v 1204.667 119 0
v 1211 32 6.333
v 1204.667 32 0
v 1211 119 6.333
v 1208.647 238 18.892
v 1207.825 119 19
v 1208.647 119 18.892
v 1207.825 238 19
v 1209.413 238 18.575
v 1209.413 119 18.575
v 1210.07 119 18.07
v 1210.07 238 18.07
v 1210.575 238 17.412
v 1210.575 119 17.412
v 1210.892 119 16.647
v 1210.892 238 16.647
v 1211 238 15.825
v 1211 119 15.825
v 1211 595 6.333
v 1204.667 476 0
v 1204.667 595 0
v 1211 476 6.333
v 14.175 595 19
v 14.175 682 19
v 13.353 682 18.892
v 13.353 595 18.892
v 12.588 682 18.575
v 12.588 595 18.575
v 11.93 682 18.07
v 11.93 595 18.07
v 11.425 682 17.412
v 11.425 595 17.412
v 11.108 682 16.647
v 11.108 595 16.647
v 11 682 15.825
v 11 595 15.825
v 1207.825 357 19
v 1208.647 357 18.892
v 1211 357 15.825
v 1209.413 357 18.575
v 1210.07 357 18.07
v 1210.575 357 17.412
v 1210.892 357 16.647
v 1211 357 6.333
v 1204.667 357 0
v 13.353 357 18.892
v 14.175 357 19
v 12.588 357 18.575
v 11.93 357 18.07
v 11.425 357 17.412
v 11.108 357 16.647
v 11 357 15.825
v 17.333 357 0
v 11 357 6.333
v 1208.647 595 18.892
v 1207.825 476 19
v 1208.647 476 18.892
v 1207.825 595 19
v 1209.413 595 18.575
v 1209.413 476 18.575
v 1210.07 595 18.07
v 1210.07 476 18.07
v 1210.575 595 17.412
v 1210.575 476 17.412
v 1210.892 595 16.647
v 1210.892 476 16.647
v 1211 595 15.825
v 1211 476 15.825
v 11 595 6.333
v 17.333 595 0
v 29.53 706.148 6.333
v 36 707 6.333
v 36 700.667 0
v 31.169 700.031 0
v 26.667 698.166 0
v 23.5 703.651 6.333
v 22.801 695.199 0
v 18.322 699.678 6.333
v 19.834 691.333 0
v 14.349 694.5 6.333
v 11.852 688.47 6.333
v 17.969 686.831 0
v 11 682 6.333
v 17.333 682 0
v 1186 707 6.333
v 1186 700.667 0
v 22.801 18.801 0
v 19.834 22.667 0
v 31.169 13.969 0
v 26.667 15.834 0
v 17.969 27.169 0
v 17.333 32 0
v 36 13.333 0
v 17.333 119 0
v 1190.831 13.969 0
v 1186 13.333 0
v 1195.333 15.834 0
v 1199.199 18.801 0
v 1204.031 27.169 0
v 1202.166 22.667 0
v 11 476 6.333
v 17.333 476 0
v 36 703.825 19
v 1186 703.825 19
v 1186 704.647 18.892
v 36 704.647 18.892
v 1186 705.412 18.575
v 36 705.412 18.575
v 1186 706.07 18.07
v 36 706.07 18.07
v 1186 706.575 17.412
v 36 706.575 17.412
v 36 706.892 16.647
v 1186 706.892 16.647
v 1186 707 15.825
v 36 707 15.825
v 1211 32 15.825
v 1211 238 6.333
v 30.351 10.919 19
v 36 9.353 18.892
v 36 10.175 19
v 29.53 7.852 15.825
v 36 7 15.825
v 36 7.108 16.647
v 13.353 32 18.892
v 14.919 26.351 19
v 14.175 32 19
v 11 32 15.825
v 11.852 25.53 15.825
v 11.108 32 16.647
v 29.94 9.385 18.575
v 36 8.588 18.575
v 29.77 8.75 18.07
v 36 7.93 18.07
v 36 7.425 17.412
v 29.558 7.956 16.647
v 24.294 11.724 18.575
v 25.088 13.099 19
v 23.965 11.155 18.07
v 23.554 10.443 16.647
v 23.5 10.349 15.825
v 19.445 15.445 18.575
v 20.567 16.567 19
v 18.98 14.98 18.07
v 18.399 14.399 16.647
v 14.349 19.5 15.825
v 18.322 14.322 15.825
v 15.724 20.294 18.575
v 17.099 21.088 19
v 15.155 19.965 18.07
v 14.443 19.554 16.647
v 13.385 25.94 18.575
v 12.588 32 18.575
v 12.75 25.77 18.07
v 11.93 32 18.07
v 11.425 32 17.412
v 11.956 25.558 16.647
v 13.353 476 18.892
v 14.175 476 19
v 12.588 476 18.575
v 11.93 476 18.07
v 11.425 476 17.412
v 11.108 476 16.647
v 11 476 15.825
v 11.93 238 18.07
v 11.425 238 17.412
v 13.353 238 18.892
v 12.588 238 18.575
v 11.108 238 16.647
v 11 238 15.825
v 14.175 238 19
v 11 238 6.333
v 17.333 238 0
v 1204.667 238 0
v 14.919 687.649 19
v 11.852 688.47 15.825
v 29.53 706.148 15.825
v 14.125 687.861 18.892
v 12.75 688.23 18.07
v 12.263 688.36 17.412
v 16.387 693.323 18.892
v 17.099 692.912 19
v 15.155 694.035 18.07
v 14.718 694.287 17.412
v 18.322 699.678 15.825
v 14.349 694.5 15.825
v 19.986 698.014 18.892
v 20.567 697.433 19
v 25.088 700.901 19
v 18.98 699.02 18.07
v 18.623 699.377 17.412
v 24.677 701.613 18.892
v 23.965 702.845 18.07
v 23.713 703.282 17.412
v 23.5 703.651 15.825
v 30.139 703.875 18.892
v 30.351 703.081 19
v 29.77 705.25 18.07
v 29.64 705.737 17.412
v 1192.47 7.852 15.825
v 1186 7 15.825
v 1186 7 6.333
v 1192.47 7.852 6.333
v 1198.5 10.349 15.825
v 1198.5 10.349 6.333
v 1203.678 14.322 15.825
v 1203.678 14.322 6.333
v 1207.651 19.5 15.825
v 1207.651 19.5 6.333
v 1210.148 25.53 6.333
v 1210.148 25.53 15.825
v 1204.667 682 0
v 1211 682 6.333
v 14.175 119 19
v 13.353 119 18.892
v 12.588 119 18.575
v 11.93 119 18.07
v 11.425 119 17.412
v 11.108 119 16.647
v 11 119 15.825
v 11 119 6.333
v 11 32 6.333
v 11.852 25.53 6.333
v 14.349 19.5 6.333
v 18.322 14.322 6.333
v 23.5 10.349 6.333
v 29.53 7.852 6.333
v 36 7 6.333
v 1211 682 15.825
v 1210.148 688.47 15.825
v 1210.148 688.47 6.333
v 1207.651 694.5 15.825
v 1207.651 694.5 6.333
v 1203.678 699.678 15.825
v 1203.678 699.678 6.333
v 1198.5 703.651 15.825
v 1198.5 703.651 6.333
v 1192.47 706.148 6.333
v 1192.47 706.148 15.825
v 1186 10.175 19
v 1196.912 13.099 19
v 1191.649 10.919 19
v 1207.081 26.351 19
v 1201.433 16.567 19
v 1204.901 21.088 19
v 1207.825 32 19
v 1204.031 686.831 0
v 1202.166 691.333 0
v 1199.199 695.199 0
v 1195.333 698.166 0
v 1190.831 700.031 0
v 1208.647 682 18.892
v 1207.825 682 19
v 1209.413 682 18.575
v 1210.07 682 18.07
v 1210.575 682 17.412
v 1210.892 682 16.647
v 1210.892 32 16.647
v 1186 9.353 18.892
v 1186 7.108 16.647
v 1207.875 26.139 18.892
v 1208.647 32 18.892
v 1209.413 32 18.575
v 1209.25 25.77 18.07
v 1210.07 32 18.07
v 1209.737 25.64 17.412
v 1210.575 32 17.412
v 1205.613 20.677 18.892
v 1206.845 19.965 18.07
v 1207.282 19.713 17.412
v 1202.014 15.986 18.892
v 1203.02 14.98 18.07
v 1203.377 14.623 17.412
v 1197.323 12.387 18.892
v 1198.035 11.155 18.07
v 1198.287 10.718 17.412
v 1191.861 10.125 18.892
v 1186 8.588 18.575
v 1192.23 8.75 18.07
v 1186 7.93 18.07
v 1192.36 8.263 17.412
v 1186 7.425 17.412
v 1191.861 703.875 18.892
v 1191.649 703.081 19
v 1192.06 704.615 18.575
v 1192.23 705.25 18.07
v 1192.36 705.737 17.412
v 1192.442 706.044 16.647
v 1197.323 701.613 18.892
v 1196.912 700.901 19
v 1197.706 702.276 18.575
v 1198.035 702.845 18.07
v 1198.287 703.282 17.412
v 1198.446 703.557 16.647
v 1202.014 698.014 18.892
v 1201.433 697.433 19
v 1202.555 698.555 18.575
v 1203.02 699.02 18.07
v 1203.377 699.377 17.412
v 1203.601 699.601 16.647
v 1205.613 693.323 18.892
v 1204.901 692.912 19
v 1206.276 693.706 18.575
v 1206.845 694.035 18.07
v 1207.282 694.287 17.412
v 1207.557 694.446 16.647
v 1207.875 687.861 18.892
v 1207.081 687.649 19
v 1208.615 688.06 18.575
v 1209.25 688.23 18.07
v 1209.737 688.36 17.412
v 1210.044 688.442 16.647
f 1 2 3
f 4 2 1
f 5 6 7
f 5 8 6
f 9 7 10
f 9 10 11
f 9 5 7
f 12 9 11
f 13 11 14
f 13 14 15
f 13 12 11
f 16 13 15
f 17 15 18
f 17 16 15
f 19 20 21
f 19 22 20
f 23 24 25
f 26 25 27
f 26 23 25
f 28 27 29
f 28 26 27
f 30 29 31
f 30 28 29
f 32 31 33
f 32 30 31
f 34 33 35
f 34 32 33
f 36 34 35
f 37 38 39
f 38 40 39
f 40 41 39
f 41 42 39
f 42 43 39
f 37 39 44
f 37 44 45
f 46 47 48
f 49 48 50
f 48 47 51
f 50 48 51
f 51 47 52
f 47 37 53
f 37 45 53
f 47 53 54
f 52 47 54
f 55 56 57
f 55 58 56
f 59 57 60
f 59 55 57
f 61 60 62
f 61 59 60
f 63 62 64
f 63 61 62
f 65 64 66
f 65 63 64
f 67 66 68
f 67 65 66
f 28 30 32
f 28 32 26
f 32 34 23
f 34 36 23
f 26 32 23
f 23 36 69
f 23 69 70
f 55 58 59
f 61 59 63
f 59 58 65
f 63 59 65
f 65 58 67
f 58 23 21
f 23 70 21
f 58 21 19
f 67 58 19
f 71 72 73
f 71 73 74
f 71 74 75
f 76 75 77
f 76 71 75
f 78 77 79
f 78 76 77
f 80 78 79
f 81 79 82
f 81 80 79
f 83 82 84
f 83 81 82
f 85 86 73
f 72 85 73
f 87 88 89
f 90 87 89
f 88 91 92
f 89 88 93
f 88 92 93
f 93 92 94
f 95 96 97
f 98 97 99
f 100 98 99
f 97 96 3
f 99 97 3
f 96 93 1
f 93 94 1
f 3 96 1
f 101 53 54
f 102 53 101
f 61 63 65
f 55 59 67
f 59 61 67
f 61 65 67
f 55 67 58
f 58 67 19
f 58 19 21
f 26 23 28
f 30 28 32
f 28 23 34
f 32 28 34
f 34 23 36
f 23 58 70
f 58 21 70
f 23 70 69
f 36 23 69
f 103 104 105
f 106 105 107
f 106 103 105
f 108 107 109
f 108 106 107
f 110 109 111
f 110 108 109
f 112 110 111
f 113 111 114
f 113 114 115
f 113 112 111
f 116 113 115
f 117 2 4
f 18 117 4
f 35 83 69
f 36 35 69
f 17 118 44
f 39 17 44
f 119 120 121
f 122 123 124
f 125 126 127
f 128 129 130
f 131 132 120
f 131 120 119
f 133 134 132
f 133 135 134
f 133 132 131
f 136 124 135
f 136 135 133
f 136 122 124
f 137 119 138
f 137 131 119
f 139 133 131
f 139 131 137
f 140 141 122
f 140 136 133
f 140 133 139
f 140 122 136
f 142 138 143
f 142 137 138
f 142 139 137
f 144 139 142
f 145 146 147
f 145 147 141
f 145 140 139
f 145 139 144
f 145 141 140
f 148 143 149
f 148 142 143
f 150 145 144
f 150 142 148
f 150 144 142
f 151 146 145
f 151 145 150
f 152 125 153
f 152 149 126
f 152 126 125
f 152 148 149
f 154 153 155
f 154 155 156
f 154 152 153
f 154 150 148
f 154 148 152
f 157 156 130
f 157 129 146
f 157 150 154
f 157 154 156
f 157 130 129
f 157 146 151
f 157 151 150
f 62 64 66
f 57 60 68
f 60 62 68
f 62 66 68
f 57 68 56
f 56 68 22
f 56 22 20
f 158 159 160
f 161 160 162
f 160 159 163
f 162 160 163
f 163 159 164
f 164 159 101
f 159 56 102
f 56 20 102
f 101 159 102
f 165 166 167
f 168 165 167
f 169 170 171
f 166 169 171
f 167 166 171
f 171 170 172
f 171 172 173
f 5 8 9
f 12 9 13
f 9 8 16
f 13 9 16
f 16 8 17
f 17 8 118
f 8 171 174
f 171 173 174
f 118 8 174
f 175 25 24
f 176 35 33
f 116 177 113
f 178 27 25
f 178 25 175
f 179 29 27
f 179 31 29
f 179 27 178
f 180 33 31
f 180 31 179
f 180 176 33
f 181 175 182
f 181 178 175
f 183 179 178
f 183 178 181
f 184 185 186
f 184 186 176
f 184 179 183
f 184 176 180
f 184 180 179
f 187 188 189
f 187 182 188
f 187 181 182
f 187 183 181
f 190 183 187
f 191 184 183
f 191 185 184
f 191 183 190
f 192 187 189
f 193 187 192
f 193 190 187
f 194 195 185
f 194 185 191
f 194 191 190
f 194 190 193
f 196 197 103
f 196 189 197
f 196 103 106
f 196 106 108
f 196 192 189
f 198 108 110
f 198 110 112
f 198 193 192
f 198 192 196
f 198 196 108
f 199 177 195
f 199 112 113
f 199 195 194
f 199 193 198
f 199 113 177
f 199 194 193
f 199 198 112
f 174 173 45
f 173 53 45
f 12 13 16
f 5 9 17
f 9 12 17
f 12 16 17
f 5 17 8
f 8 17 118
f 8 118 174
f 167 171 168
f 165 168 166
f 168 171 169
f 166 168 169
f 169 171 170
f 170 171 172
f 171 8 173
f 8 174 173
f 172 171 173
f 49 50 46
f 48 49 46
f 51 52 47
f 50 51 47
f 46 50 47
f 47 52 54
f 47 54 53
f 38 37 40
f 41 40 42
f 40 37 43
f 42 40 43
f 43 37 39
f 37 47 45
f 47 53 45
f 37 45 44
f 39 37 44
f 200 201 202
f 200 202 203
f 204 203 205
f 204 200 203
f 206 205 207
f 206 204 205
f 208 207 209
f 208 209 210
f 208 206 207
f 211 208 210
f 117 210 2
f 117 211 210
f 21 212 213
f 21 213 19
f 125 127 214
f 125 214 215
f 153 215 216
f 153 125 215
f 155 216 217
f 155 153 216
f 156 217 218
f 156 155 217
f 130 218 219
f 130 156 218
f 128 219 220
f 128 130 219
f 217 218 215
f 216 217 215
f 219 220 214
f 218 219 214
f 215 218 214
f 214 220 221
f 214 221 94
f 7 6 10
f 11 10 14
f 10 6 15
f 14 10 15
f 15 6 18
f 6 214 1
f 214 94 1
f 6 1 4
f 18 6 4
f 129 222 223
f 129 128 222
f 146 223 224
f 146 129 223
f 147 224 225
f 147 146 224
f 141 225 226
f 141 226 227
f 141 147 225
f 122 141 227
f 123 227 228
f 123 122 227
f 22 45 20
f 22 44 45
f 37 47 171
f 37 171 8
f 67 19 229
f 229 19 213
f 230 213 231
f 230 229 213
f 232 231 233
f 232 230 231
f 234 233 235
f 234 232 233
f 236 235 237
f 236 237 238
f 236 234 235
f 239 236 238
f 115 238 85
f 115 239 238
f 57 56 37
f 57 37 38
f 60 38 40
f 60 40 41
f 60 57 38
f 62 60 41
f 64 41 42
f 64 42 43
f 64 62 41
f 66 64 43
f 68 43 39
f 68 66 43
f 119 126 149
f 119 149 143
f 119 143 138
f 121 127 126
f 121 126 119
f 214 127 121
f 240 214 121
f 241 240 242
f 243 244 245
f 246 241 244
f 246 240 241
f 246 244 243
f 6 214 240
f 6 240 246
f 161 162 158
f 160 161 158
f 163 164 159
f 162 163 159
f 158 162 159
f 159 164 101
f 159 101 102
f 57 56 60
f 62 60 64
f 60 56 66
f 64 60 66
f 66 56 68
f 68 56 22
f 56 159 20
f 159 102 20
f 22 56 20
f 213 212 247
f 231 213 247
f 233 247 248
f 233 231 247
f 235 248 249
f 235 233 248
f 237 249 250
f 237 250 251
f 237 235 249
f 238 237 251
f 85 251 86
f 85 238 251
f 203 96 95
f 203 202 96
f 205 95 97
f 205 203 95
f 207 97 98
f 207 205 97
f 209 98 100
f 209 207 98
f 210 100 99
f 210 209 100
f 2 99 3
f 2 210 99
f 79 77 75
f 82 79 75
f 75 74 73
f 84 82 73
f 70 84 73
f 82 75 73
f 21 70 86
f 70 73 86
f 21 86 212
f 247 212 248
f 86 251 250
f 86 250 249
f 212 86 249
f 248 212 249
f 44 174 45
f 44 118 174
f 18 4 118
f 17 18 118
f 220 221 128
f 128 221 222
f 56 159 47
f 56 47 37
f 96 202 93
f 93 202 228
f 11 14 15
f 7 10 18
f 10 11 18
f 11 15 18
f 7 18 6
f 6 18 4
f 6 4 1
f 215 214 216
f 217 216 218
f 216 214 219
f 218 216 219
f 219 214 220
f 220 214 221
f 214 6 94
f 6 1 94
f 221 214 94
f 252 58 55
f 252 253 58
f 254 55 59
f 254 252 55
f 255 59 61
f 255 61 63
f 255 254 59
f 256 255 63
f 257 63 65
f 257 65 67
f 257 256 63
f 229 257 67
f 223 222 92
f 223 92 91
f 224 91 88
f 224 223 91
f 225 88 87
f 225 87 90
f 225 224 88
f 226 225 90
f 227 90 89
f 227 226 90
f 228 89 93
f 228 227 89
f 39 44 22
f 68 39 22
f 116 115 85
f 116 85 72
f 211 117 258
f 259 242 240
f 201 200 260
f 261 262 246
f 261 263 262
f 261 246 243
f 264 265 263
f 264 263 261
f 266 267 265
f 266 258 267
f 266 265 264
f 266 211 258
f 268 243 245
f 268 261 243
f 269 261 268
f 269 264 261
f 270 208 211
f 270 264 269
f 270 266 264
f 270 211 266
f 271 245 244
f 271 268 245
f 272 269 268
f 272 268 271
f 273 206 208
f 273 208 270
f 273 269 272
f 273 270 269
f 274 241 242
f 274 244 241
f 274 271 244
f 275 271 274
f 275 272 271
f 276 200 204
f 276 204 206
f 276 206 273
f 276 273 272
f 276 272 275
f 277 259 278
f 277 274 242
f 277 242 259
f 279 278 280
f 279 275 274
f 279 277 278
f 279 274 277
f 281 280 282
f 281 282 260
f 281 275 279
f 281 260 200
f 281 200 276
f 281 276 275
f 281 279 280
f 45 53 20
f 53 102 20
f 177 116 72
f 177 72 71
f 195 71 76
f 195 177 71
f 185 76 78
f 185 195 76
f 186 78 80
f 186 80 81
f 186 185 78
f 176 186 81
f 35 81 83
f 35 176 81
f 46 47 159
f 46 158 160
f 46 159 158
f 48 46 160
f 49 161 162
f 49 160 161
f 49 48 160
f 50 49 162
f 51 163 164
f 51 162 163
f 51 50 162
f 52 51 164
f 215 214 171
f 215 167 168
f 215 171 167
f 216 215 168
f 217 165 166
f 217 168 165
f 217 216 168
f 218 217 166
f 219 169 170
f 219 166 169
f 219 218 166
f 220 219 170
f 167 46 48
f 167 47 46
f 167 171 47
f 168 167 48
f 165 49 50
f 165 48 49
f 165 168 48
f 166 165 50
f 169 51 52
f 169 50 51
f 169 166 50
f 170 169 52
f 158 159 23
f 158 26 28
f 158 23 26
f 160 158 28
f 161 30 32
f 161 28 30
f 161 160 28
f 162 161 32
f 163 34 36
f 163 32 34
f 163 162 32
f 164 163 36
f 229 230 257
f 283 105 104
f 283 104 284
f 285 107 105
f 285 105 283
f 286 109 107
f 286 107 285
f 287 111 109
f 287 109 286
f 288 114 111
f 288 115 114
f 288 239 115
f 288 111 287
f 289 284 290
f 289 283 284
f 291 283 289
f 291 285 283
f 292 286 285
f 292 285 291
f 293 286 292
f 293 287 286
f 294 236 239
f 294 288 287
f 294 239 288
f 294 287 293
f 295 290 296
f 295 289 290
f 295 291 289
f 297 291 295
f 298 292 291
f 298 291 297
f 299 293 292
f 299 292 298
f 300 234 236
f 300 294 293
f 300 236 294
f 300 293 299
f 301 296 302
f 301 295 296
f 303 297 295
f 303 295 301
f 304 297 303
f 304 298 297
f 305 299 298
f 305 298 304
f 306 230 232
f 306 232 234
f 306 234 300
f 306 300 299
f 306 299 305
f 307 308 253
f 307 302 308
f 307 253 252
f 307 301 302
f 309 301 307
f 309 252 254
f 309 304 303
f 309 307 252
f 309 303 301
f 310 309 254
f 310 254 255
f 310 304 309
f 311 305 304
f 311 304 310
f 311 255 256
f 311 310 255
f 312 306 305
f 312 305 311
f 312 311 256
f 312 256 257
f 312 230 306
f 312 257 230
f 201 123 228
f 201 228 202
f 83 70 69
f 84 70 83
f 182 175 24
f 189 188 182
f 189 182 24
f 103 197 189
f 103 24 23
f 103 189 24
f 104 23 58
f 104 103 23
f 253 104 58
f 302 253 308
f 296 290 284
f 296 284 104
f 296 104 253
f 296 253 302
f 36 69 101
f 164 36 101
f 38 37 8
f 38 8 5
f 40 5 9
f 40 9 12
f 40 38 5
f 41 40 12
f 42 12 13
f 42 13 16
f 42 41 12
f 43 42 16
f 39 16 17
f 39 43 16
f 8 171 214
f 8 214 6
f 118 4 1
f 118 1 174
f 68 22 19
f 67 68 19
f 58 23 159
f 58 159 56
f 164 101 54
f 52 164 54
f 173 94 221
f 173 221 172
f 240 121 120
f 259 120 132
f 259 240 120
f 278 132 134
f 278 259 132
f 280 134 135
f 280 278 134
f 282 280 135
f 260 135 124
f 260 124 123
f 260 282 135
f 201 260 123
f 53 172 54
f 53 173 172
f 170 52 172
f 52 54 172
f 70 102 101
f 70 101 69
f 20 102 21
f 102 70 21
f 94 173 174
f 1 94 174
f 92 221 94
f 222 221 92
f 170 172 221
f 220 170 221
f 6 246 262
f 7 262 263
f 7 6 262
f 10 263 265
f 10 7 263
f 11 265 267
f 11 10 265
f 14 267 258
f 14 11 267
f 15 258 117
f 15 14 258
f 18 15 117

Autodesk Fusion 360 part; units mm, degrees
sketch "board" plane through (0, 0, 0) normal (0, 0, 1) x (1, 0, 0) in component "top"
  line L0 (0, 0) -> (1222, 0)
  line L1 (1222, 0) -> (1222, 119)
  line L2 (1222, 119) -> (0, 119)
  line L3 (0, 119) -> (0, 0)
  dimension "d8" = 119
  dimension "d9" = 1222
extrude "Extrude1" add sketch "board" along normal blind 19 makes body 1 in component "top"
pattern_linear "R-Pattern1" count 6 spacing 119 along (0, 1, 0) of bodies 1 makes body 2 at (407.3333, 198.3333, 0) makes body 3 at (407.3333, 317.3333, 0) makes body 4 at (407.3333, 436.3333, 0) makes body 5 at (407.3333, 555.3333, 0) makes body 6 at (407.3333, 674.3333, 0) in component "top"
sketch "target" plane through (0, 0, 0) normal (0, 0, 1) x (1, 0, 0) in component "top"
  line L0 (11, 7) -> (1211, 7)
  line L1 (1211, 7) -> (1211, 707)
  line L2 (1211, 707) -> (11, 707)
  line L3 (11, 707) -> (11, 7)
  line L4 (1211, 707) -> (1222, 714) construction
  line L5 (1211, 7) -> (1222, 0) construction
  line L6 (11, 7) -> (0, 0) construction
  line L7 (0, 714) -> (11, 707) construction
  point P0 (1222, 0)
  point P1 (0, 714)
  point P2 (1222, 714)
  dimension "d16" = 1200
  dimension "d17" = 700
extrude "Extrude2" cut sketch "target" along normal up to surface (19 mm away) keep common part bodies 1 2 3 4 5 6 in component "top"
sketch "top profile" plane through (0, 0, 19) normal (0, 0, 1) x (-1, 0, 0) in component "top"
  line L0 (-11, -119) -> (-11, -7)
  line L1 (-11, -7) -> (-1211, -7)
  line L2 (-1211, -7) -> (-1211, -119)
  line L3 (-1211, -119) -> (-11, -119)
  line L4 (-36, -7) -> (-1186, -7)
  line L5 (-1211, -32) -> (-1211, -682)
  line L6 (-1186, -707) -> (-36, -707)
  line L7 (-11, -682) -> (-11, -32)
  arc A0 (-36, -707) -> (-11, -682) centre (-36, -682) ccw
  arc A1 (-1211, -682) -> (-1186, -707) centre (-1186, -682) ccw
  arc A2 (-1186, -7) -> (-1211, -32) centre (-1186, -32) ccw
  arc A3 (-11, -32) -> (-36, -7) centre (-36, -32) ccw
  line L8 (-1211, -707) -> (-11, -707)
  line L9 (-1211, -7) -> (-1211, -707)
  line L10 (-11, -7) -> (-1211, -7)
  line L11 (-11, -707) -> (-11, -7)
  point P0 (-1211, -707)
  dimension "d21" = 25
extrude "Extrude3" cut sketch "top profile" against normal up to surface (19 mm away) contours L0 L1 L2 L3 L4 L5 L7 A2 A3 L9 L10 L11 | L3 L5 L6 L7 A0 A1 L8 L9 L11 keep common part bodies 1 2 3 4 5 6 in component "top"
fillet "Fillet1" radius 3.175 18 edges at (1211, 75.5, 19) (1203.6777, 14.3223, 19) (611, 7, 19) (18.3223, 14.3223, 19) (11, 75.5, 19) (1211, 178.5, 19) (11, 178.5, 19) (1211, 297.5, 19) (11, 297.5, 19) (1211, 416.5, 19) (11, 416.5, 19) (1211, 535.5, 19) (11, 535.5, 19) (11, 638.5, 19) (18.3223, 699.6777, 19) (611, 707, 19) (1203.6777, 699.6777, 19) (1211, 638.5, 19) on bodies 1 2 3 4 5 6 in component "top"
chamfer "Chamfer1" distance 6.3333 angle 45 18 edges at (1211, 416.5, 0) (11, 416.5, 0) (1211, 297.5, 0) (11, 297.5, 0) (611, 7, 0) (18.3223, 14.3223, 0) (11, 75.5, 0) (1211, 75.5, 0) (1203.6777, 14.3223, 0) (1211, 178.5, 0) (11, 178.5, 0) (1211, 638.5, 0) (1203.6777, 699.6777, 0) (611, 707, 0) (18.3223, 699.6777, 0) (11, 638.5, 0) (1211, 535.5, 0) (11, 535.5, 0) on bodies 1 2 3 4 5 6 in component "top"
sketch "hardware" plane through (0, 0, 0) normal (0, 0, 1) x (1, 0, 0) in component "hardware"
  line L0 (36, 17) -> (61, 17)
  line L1 (61, 17) -> (61, 697)
  line L2 (61, 697) -> (36, 697)
  line L3 (36, 697) -> (36, 17)
  line L4 (11, 707) -> (11, 7)
  line L5 (11, 7) -> (1211, 7)
  line L6 (1211, 707) -> (11, 707)
  line L7 (1211, 7) -> (1211, 707) construction
  line L8 (11, 357) -> (1211, 357) construction
  line L9 (611, 7) -> (611, 707) construction
  line L10 (1186, 697) -> (1186, 17)
  line L11 (1186, 17) -> (1161, 17)
  line L12 (1161, 697) -> (1186, 697)
  line L13 (1161, 17) -> (1161, 697)
  line L14 (137.2, 52.2) -> (213.4, 52.2)
  line L15 (213.4, 52.2) -> (213.4, 661.8)
  line L16 (213.4, 661.8) -> (137.2, 661.8)
  line L17 (137.2, 661.8) -> (137.2, 52.2)
  line L18 (175.3, 52.2) -> (175.3, 661.8) construction
  line L19 (137.2, 52.2) -> (213.4, 174.12) construction
  line L20 (213.4, 174.12) -> (137.2, 174.12) construction
  line L21 (137.2, 174.12) -> (213.4, 296.04) construction
  line L22 (213.4, 296.04) -> (137.2, 296.04) construction
  line L23 (137.2, 296.04) -> (213.4, 417.96) construction
  line L24 (213.4, 417.96) -> (137.2, 417.96) construction
  line L25 (137.2, 417.96) -> (213.4, 539.88) construction
  line L26 (213.4, 539.88) -> (137.2, 539.88) construction
  line L27 (137.2, 539.88) -> (213.4, 661.8) construction
  circle A0 centre (175.3, 174.12) radius 3.5
  circle A1 centre (175.3, 296.04) radius 3.5
  circle A2 centre (175.3, 417.96) radius 3.5
  circle A3 centre (175.3, 539.88) radius 3.5
  line L28 (1084.8, 661.8) -> (1084.8, 52.2)
  line L29 (1084.8, 52.2) -> (1008.6, 52.2)
  line L30 (1008.6, 661.8) -> (1084.8, 661.8)
  line L31 (1008.6, 52.2) -> (1008.6, 661.8)
  circle A4 centre (1046.7, 539.88) radius 3.5
  circle A5 centre (1046.7, 417.96) radius 3.5
  circle A6 centre (1046.7, 174.12) radius 3.5
  circle A7 centre (1046.7, 296.04) radius 3.5
  point P0 (175.3, 357)
  dimension "d24" = 25
  dimension "d25" = 10
  dimension "d26" = 10
  dimension "d27" = 25
  dimension "d28" = 609.6
  dimension "d29" = 76.2
  dimension "d30" = 7
  dimension "d31" = 76.2
component "top" placed x (1, 0, 0) y (0, 1, 0) z (0, 0, 1) at (0, 0, 0)
component "hardware" placed x (1, 0, 0) y (0, 1, 0) z (0, 0, 1) at (0, 0, 0)
equation "rawBoardWidth = 129 mm"
equation "boardThickness = 19 mm"
equation "boardLength = 1222 mm"
equation "boardWidth = rawBoardWidth - ( 2 * 5 ) * 1 mm"
equation "targetWidth = 1200 mm"
equation "targetDepth = 700 mm"
equation "boardCount = 6"
equation "d8 = boardWidth"
equation "d9 = boardLength"
equation "d10 = boardThickness"
equation "d12 = boardCount"
equation "d14 = boardWidth"
equation "d16 = targetWidth"
equation "d17 = targetDepth"
equation "cornerRadius = 25 mm"
equation "d21 = cornerRadius"
equation "d26 = d25"
equation "d28 = 24\""
equation "d29 = 3\""
equation "d31 = d29"
equation "d33 = 1/8\""
equation "d34 = boardThickness / 3"
